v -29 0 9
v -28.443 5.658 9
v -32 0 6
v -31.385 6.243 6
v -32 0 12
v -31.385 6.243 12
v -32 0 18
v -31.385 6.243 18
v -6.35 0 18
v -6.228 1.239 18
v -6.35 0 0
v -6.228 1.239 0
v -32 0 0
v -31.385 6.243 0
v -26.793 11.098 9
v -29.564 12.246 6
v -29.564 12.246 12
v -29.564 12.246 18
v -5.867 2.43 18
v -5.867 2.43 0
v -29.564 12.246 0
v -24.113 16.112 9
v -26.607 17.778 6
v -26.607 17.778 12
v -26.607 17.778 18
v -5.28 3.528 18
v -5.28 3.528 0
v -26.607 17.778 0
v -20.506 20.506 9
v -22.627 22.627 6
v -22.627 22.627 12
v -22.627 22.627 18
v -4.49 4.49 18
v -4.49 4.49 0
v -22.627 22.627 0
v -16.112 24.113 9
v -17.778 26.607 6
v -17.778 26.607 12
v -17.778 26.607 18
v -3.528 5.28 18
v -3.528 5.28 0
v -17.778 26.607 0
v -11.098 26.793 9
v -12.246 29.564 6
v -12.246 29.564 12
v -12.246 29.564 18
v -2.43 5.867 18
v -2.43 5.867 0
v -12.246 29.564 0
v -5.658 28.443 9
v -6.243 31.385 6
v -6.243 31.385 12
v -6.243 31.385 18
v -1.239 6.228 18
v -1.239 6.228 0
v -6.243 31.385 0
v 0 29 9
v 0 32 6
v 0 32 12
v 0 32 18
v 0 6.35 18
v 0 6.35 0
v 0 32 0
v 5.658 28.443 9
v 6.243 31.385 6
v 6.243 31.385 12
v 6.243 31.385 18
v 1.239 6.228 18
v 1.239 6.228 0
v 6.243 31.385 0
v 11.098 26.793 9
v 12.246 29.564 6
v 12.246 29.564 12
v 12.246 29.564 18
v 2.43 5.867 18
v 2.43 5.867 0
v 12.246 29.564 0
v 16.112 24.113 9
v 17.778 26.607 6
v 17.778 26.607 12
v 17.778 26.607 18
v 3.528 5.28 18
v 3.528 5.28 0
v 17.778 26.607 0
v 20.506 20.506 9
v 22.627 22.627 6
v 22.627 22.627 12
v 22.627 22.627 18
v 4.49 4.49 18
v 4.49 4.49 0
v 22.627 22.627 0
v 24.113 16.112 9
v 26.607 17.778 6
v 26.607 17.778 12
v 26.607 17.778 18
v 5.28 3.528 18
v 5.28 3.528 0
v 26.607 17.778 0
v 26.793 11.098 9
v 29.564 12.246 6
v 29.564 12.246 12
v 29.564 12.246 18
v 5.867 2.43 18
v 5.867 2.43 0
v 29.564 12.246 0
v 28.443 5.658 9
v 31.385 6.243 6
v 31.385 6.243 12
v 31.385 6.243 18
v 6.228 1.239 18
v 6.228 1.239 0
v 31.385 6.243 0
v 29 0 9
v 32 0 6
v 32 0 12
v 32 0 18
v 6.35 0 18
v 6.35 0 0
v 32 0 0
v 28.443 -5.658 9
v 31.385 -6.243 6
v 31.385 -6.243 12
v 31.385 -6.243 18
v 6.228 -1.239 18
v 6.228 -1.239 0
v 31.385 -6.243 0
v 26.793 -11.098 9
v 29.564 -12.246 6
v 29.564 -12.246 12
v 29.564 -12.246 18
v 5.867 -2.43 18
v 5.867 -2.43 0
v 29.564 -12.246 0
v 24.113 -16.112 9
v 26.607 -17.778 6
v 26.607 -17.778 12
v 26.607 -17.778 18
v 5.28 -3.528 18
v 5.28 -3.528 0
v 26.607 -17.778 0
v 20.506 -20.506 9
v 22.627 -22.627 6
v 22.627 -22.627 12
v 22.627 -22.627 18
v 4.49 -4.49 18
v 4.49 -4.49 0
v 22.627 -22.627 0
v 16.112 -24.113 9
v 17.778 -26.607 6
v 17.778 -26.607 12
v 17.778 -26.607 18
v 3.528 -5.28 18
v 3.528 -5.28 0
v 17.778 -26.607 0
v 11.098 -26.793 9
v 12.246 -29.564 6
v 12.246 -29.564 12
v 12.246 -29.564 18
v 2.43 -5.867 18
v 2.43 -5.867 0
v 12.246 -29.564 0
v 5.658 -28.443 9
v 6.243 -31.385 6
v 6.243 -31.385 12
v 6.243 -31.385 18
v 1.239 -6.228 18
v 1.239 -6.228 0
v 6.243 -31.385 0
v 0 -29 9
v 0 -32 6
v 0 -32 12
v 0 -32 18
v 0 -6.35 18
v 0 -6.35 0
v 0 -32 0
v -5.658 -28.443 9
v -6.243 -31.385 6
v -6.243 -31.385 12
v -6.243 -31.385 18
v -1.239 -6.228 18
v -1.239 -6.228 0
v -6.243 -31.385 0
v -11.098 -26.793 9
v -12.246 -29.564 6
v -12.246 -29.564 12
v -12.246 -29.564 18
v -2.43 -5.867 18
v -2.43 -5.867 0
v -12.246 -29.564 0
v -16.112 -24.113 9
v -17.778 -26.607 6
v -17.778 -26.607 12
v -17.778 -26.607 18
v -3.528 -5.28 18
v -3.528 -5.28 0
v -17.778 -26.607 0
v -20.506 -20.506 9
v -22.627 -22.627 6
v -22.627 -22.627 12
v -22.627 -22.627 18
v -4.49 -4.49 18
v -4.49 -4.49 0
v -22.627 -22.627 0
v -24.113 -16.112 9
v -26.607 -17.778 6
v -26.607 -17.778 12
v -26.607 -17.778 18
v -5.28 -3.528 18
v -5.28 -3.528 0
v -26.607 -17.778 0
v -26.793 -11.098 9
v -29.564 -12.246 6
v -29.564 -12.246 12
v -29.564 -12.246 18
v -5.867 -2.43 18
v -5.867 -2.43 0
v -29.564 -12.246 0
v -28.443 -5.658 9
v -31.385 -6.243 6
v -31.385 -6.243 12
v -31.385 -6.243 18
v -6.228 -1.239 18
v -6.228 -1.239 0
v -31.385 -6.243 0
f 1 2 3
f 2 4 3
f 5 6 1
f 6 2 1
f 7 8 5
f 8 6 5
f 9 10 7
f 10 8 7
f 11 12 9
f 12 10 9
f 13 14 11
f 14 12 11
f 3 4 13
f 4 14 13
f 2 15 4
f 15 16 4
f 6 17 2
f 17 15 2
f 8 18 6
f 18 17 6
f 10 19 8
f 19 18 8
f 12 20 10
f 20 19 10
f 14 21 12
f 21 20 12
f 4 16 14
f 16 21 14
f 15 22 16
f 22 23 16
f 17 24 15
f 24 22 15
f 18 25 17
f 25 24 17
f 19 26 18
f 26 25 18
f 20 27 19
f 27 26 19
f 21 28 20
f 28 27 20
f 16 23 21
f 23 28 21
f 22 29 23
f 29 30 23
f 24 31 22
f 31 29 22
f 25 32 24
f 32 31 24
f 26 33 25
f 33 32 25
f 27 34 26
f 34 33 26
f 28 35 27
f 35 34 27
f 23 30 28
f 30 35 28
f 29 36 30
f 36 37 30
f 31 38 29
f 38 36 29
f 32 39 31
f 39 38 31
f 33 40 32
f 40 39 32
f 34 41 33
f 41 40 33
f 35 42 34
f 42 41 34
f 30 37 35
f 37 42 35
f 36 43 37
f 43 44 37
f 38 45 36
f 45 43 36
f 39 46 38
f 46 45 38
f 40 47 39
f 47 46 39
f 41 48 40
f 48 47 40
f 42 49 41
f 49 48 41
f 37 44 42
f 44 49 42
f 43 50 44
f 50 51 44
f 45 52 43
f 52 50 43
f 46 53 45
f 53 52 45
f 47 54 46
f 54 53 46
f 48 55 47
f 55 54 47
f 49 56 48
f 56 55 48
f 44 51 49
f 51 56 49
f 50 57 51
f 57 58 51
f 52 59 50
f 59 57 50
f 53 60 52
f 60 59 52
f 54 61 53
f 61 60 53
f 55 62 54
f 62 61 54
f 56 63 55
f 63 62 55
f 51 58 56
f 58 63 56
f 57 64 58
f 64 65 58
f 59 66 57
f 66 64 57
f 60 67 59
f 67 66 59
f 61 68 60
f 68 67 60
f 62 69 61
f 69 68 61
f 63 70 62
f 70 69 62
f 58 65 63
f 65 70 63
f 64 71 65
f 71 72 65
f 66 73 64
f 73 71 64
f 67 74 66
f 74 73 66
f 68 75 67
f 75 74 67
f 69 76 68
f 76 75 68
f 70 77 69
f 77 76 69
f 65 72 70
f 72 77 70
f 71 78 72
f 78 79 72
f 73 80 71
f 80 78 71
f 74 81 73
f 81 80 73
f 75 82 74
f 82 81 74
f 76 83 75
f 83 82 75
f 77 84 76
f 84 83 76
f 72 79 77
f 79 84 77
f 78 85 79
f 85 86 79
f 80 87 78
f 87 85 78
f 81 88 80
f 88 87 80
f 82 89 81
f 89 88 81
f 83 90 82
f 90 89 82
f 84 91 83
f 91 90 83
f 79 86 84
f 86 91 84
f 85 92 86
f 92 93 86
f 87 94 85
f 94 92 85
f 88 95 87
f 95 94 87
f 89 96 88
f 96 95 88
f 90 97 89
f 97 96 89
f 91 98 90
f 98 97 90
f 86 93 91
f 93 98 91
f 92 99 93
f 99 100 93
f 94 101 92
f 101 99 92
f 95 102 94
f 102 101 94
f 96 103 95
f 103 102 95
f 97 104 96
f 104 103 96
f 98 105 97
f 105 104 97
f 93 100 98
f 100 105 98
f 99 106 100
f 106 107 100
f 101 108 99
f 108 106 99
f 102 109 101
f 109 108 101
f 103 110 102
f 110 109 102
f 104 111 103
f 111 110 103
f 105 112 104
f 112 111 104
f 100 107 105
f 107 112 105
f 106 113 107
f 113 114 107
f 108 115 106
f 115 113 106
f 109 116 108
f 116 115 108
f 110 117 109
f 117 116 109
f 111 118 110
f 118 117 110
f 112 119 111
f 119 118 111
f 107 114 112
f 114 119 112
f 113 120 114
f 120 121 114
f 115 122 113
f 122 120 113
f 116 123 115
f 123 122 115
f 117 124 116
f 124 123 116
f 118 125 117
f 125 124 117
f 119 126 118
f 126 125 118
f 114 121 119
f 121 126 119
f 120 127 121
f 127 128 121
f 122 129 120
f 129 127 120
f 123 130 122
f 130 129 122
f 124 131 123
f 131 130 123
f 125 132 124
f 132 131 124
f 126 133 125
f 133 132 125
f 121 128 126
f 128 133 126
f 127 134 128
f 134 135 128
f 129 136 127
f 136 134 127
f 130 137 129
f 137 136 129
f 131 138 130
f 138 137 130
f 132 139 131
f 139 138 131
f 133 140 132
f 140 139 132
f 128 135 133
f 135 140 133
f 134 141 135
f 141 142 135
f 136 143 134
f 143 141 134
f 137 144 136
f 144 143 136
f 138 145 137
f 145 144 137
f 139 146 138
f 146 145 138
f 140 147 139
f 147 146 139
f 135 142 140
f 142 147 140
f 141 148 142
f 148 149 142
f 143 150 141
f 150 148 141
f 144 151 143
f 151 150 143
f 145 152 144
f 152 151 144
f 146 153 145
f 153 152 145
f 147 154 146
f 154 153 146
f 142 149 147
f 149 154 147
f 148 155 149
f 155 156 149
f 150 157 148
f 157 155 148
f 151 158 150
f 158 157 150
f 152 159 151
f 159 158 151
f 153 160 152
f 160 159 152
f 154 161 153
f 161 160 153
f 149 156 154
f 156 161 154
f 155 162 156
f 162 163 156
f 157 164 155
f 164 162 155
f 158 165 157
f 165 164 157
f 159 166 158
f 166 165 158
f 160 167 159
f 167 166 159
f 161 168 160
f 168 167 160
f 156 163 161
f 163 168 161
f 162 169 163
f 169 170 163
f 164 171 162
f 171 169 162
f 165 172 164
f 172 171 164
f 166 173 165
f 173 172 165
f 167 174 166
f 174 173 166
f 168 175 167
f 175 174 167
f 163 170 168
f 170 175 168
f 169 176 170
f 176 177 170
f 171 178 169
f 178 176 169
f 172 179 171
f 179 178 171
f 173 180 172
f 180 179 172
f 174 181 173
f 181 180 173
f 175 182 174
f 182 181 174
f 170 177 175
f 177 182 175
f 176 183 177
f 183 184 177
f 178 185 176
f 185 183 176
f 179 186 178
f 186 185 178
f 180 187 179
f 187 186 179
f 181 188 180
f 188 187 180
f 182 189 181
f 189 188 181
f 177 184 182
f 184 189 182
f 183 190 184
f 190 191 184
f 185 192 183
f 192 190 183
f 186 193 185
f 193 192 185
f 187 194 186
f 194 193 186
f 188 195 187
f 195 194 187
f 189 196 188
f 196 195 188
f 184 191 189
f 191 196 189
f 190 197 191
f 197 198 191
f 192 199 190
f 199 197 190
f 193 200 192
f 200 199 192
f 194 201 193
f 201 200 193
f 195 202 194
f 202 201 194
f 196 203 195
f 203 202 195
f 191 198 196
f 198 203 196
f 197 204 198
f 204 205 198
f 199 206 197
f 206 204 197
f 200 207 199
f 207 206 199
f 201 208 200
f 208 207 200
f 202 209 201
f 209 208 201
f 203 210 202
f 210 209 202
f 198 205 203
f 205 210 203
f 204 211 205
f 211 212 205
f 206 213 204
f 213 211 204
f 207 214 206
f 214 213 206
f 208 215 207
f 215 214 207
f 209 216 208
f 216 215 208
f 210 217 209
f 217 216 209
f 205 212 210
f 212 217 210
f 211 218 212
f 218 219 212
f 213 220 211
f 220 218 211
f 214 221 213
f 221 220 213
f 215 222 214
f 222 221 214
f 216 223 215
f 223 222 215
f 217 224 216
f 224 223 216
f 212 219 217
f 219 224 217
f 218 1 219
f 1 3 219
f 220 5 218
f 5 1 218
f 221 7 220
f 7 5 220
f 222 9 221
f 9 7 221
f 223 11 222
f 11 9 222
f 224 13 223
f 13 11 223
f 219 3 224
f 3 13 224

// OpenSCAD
$fn = 32;

// ----------------------------------------------------------------------
// Belt roller: 64 mm barrel, 18 mm wide, bore 12.7 mm
// ----------------------------------------------------------------------

// --- parameters (mm) ---
bore_d = 12.7;            // bore
barrel_d = 64;            // barrel diameter
roller_w = 18;            // roller width
groove_w = 6;             // guide groove width
groove_d = 3;             // guide groove depth

roller_profile = [[6.35, 0], [32, 0], [32, 6], [29, 9], [32, 12], [32, 18], [6.35, 18]];

/* the profile stays clear of the axis, so the bore comes out of the revolve */
rotate_extrude() polygon(roller_profile);
